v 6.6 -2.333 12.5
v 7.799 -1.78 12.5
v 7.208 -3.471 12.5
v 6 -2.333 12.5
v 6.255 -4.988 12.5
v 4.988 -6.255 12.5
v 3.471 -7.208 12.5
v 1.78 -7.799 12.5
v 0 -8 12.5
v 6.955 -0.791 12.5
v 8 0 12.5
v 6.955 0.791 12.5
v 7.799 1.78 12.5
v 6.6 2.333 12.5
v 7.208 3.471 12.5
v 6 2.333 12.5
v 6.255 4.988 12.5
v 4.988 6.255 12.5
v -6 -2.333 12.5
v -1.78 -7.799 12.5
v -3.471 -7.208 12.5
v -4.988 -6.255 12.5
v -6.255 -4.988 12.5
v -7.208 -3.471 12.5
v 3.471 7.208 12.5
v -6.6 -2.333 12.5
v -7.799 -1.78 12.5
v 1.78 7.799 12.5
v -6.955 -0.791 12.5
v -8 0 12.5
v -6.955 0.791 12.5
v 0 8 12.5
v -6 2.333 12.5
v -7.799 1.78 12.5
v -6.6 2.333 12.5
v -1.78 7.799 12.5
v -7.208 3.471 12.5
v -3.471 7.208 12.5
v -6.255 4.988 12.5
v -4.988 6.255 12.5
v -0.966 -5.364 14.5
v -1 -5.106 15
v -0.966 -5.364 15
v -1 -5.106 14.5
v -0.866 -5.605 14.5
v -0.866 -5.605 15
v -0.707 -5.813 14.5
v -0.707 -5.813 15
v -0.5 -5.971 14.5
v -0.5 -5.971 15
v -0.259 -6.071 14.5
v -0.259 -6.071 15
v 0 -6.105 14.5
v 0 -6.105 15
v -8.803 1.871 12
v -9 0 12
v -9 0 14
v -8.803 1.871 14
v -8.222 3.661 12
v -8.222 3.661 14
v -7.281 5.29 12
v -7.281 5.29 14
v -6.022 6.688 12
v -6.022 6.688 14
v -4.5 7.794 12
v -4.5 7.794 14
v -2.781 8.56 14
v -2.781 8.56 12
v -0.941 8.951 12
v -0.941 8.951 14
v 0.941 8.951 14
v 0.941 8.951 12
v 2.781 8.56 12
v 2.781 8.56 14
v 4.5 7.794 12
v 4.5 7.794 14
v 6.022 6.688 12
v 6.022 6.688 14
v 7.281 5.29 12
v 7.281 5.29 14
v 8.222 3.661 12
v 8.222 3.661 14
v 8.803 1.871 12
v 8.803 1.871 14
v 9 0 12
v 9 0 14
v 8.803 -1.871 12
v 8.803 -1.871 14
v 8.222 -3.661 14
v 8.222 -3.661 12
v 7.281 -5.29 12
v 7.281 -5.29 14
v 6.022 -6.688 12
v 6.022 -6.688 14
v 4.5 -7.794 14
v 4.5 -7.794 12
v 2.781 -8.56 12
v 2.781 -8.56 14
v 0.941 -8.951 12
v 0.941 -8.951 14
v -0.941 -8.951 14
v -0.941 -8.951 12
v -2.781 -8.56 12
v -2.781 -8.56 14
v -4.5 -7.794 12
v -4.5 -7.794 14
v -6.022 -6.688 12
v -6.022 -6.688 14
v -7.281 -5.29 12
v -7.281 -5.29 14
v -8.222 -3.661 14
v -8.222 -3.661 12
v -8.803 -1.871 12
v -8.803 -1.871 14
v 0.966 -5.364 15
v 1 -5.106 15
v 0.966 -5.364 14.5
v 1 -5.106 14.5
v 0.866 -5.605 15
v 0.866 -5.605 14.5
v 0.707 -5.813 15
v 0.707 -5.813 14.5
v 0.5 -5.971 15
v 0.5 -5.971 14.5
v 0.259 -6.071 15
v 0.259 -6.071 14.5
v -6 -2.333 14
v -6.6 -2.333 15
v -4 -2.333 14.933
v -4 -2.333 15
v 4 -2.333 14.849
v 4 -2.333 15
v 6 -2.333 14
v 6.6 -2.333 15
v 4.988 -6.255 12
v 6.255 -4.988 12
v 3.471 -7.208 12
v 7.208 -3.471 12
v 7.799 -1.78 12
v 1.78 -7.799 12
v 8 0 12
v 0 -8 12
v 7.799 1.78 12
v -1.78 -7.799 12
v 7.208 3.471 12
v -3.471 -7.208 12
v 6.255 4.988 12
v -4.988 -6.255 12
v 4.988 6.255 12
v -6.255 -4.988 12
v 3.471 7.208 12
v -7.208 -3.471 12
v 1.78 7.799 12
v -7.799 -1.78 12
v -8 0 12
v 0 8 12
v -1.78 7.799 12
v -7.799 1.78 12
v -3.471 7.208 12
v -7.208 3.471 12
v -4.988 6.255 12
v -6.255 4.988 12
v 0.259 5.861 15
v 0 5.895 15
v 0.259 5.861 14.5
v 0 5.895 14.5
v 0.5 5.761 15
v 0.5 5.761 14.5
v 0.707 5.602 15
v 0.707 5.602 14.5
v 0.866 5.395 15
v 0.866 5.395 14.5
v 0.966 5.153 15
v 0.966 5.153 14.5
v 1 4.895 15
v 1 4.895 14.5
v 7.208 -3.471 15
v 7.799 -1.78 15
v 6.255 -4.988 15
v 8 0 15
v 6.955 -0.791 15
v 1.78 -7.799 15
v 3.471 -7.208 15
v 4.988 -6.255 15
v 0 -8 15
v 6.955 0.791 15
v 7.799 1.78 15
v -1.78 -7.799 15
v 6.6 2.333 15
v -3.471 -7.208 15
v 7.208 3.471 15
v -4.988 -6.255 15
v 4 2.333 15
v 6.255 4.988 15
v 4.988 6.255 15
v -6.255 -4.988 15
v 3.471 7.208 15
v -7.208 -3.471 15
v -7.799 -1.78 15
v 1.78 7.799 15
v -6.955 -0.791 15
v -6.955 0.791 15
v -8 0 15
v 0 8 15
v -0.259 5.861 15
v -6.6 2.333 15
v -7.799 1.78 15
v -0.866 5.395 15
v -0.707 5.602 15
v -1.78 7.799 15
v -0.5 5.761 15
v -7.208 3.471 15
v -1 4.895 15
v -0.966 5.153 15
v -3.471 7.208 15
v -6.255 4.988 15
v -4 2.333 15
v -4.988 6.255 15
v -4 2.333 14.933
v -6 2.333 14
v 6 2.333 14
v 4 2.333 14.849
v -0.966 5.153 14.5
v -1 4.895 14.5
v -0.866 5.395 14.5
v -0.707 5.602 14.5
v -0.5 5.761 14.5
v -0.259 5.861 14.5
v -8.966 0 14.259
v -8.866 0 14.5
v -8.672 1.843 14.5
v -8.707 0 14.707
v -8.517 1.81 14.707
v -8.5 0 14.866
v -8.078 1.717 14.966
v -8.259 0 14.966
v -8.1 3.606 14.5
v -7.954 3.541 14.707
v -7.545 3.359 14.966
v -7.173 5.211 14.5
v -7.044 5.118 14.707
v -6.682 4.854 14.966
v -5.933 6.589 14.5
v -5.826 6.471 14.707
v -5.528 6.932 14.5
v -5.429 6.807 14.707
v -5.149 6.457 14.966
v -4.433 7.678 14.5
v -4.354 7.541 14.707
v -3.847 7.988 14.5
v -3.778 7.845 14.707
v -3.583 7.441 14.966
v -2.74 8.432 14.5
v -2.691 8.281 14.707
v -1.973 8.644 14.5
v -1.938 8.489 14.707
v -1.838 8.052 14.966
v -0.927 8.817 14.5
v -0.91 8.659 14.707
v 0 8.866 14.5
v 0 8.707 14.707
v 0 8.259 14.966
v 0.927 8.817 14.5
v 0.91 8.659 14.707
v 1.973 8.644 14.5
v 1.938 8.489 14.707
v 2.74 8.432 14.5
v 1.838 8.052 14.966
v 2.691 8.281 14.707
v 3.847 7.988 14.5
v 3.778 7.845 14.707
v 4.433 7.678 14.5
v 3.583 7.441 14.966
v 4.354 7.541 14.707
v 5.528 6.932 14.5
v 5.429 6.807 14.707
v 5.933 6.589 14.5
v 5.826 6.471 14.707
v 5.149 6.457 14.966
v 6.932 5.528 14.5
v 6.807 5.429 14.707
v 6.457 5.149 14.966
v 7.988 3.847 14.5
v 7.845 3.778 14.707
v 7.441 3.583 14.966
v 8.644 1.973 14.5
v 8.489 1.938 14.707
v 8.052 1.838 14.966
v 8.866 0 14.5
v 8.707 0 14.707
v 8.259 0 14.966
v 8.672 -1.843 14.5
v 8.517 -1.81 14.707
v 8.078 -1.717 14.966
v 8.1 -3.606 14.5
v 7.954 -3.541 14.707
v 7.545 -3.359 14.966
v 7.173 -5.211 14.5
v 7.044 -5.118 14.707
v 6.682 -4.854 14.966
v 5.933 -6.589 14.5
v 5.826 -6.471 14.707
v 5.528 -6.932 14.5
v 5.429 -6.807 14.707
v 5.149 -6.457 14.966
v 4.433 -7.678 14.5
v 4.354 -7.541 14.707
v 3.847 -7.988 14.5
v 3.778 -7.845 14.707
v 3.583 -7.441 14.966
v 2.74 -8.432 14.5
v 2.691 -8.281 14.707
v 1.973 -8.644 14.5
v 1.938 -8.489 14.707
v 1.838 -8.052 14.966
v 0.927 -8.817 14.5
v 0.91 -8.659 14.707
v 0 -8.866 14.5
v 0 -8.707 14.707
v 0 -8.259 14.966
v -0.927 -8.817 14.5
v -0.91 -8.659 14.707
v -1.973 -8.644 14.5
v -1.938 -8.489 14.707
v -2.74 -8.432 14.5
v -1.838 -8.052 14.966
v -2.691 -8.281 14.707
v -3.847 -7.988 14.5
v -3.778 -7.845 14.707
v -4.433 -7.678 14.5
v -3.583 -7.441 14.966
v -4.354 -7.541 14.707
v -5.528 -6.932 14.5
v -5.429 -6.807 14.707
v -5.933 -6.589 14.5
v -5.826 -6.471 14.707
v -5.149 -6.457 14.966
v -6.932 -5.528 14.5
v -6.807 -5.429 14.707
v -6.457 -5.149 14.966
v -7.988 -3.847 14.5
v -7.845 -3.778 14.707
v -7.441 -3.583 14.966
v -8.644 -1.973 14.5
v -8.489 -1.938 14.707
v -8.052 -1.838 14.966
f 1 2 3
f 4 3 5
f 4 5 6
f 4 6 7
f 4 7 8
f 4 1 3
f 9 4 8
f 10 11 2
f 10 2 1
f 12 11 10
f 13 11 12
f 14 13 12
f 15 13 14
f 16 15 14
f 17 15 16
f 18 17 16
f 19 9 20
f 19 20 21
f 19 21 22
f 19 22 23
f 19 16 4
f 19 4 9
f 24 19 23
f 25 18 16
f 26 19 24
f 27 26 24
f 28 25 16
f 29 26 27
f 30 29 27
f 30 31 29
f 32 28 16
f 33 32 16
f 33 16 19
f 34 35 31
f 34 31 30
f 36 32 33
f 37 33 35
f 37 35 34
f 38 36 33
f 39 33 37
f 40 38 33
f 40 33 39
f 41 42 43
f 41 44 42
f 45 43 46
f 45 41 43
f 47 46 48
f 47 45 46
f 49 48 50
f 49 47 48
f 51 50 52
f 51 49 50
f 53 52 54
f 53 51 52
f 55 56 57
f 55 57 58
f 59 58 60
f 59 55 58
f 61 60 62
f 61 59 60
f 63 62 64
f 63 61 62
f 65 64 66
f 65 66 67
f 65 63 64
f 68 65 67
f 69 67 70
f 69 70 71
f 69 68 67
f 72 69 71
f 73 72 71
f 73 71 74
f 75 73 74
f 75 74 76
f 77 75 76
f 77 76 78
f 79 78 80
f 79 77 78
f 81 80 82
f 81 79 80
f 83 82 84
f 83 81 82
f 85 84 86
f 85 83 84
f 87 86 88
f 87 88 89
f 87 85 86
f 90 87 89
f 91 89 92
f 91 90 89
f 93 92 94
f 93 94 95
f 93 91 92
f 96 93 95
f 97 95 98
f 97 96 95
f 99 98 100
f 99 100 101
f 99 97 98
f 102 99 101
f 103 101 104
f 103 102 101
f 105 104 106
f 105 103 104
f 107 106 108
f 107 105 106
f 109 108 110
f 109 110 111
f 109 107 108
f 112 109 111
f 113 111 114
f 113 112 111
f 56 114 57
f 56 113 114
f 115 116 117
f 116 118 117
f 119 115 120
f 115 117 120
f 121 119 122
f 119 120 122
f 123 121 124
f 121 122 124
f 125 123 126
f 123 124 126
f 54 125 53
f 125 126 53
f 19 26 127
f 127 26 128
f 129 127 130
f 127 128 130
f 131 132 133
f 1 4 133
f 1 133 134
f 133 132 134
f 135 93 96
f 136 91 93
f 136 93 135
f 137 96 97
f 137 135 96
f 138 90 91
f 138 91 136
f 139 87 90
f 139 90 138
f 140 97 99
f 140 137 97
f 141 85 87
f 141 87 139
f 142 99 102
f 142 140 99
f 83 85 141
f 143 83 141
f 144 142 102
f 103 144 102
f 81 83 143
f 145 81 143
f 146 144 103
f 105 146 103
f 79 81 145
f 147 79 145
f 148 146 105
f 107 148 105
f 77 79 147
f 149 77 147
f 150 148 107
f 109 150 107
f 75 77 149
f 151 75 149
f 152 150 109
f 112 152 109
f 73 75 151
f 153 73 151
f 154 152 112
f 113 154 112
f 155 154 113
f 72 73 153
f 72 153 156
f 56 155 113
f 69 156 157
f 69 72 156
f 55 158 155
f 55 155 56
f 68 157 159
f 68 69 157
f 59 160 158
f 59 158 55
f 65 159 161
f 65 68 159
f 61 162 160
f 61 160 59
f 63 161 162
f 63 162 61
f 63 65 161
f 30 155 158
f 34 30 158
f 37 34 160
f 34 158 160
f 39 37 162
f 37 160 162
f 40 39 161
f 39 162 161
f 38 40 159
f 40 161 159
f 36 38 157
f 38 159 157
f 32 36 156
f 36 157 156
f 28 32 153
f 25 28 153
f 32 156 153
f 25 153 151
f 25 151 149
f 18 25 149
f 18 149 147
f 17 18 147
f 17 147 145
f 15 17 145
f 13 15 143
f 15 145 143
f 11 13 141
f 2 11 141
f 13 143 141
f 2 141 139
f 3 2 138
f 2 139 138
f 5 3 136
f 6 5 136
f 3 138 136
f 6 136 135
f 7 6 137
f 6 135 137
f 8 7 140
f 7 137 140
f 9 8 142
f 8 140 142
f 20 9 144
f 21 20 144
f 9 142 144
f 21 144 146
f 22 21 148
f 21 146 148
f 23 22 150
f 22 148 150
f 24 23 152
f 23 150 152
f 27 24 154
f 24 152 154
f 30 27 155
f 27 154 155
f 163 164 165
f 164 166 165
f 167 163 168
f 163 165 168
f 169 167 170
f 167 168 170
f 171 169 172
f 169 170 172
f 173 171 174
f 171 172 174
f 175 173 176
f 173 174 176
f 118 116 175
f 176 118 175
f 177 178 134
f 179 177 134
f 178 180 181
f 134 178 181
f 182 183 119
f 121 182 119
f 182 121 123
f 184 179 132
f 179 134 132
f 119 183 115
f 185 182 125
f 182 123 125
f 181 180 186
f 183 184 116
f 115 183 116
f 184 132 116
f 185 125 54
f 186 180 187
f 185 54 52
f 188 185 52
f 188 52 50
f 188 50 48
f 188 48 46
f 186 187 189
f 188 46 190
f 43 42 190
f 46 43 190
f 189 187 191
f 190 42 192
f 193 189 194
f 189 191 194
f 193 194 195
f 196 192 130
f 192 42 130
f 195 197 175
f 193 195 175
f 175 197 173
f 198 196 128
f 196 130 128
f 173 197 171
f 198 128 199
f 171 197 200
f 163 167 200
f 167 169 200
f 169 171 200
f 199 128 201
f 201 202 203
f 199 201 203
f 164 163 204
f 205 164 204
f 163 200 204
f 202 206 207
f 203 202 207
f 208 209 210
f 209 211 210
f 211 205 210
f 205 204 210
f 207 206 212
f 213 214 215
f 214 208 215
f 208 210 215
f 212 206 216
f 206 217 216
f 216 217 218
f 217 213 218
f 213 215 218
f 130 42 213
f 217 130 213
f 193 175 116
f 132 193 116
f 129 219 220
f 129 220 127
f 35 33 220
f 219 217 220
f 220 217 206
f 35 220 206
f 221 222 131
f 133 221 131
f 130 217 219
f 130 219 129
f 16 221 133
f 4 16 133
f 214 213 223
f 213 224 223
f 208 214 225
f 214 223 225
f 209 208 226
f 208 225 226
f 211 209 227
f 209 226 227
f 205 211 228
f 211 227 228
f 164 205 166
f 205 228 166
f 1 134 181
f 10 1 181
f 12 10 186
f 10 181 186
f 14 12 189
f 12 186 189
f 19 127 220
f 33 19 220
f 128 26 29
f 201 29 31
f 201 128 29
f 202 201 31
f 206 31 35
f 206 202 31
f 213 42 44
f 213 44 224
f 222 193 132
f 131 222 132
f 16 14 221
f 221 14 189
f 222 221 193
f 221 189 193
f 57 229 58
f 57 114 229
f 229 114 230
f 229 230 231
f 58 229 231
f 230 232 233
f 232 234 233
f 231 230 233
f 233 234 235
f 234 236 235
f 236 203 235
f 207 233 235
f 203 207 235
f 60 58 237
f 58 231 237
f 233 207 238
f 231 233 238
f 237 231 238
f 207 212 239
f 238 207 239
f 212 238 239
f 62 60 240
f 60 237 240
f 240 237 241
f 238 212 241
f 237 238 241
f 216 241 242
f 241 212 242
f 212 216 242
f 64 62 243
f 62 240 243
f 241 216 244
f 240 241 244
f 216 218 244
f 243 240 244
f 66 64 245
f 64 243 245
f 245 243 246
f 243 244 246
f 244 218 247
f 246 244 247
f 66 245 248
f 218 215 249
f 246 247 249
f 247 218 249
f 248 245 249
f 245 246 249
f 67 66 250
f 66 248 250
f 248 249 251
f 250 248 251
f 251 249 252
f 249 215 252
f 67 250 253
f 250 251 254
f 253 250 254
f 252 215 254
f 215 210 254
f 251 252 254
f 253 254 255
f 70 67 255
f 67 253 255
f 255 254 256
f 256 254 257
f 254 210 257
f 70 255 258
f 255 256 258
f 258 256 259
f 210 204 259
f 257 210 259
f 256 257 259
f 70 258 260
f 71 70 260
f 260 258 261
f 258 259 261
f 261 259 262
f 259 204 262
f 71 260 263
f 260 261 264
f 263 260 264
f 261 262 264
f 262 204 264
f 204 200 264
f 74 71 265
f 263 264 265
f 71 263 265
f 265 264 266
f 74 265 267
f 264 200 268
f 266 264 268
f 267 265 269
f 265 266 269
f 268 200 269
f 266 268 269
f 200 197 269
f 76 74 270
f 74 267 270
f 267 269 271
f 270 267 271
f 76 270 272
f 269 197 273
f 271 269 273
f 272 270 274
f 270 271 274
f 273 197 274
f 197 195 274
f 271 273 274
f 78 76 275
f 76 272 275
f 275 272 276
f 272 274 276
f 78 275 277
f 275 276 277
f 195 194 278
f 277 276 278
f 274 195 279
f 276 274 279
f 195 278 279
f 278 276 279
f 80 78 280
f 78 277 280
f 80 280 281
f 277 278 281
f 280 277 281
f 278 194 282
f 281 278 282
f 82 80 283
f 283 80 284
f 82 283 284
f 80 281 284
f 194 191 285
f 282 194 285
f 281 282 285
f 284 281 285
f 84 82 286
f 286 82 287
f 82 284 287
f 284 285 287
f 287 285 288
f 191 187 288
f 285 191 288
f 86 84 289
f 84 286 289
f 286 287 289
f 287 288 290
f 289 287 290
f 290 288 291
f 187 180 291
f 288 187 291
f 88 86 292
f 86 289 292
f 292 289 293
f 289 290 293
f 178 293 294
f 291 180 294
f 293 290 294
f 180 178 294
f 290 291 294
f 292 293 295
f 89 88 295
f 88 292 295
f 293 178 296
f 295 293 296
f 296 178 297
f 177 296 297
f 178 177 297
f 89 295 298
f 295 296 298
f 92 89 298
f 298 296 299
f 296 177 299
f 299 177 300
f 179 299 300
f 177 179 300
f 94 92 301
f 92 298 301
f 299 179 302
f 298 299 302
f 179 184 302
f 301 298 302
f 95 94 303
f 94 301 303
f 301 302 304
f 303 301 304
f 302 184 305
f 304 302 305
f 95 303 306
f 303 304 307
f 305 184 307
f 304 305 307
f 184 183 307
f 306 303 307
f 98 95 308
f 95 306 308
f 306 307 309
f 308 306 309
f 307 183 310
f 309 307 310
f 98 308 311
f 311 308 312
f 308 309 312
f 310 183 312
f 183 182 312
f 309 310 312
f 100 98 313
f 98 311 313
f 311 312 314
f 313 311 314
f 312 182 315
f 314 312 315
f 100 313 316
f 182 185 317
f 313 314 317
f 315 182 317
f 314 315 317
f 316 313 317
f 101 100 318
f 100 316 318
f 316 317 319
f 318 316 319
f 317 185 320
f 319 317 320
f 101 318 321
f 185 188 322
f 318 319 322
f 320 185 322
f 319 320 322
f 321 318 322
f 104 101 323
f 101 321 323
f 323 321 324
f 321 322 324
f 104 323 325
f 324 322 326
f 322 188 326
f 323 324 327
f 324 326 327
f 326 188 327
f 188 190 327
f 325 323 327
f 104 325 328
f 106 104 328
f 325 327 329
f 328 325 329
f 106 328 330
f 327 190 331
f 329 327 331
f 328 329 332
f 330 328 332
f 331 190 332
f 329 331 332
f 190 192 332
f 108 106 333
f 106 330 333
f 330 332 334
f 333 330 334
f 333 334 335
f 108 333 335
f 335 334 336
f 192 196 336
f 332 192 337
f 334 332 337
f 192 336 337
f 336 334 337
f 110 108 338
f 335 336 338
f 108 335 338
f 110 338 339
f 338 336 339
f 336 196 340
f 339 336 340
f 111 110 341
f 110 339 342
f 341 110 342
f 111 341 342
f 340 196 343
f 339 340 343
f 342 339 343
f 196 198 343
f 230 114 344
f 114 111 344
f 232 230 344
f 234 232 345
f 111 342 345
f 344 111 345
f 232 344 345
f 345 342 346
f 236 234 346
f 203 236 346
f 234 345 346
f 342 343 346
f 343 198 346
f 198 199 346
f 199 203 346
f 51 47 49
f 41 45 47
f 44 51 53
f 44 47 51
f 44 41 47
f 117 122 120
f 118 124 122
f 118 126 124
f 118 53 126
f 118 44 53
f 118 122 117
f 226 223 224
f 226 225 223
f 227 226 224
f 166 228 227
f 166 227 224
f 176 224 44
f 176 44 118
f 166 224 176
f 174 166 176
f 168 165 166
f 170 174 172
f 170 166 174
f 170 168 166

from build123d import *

# Parameters (mm, degrees)
SKETCH_1_R          = 9
EXTRUDE_1_DEPTH     = 3
FILLET_1_R          = 1
SKETCH_3_W          = 2
SKETCH_3_H          = 12
CUT_EXTRUDE_1_DEPTH = 0.5
FILLET_2_R          = 1
CUT_EXTRUDE_2_DEPTH = 1
CHAMFER_2_SIZE      = 2
CHAMFER_2_SIZE2     = 0.932615316
CHAMFER_5_SIZE      = 2
CHAMFER_5_SIZE2     = 0.848949632
CUT_EXTRUDE_3_DEPTH = 8
CUT_EXTRUDE_START   = -2
SKETCH_7_R          = 7
CUT_EXTRUDE_4_DEPTH = 2
EXTRUDE_2_DEPTH     = 2
SKETCH_9_R          = 8
CUT_EXTRUDE_5_DEPTH = 0.5


with BuildPart() as part:
    # 草图1 → 凸台-拉伸1 (new body)
    with BuildSketch(Plane(origin=(0, 0, 12), x_dir=(-1, 0, 0), z_dir=(0, 0, -1))):
        Circle(SKETCH_1_R)
    extrude(amount=-EXTRUDE_1_DEPTH)

    # 圆角1
    fillet_1_edges = [part.edges().sort_by_distance(p)[0] for p in [
        (9, 0, 15),
    ]]
    fillet(fillet_1_edges, radius=FILLET_1_R)

    # 草图3 → 切除-拉伸1 (cut)
    with BuildSketch(Plane.XY.offset(15)):
        with Locations((0, -0.105406486)):
            Rectangle(SKETCH_3_W, SKETCH_3_H)
    extrude(amount=-CUT_EXTRUDE_1_DEPTH, mode=Mode.SUBTRACT)

    # 圆角2
    fillet_2_edges = [part.edges().sort_by_distance(p)[0] for p in [
        (1, -6.105406486, 14.75),
        (-1, -6.105406486, 14.75),
        (1, 5.894593514, 14.75),
        (-1, 5.894593514, 14.75),
    ]]
    fillet(fillet_2_edges, radius=FILLET_2_R - 0.0001)  # a hair under: the kernel refuses the full size

    # 草图4 → 切除-拉伸2 (cut)
    with BuildSketch(Plane.XY.offset(15)):
        with BuildLine():
            Line((-6.599663291, 2.333333333), (-4, 2.333333333))
            Line((-4, 2.333333333), (-4, -2.333333333))
            Line((-4, -2.333333333), (-6.599663291, -2.333333333))
            ThreePointArc((-6.599663291, -2.333333333), (-7, 0), (-6.599663291, 2.333333333))
        make_face()
        with BuildLine():
            Line((4, -2.333333333), (6.599663291, -2.333333333))
            ThreePointArc((6.599663291, -2.333333333), (7, 0), (6.599663291, 2.333333333))
            Line((6.599663291, 2.333333333), (4, 2.333333333))
            Line((4, 2.333333333), (4, -2.333333333))
        make_face()
    extrude(amount=-CUT_EXTRUDE_2_DEPTH, mode=Mode.SUBTRACT)

    # 倒角2
    chamfer_2_edges = [part.edges().sort_by_distance(p)[0] for p in [
        (-4, 0, 14),
    ]]
    chamfer_2_side = [part.faces().sort_by_distance(p)[0] for p in [
        (-5.436521823, 0, 14),
    ]]
    chamfer(chamfer_2_edges, length=CHAMFER_2_SIZE, length2=CHAMFER_2_SIZE2, reference=chamfer_2_side[0])

    # 倒角5
    chamfer_5_edges = [part.edges().sort_by_distance(p)[0] for p in [
        (4, 0, 14),
    ]]
    chamfer_5_side = [part.faces().sort_by_distance(p)[0] for p in [
        (5.436521823, 0, 14),
    ]]
    chamfer(chamfer_5_edges, length=CHAMFER_5_SIZE, length2=CHAMFER_5_SIZE2, reference=chamfer_5_side[0])

    # 草图6 → 切除-拉伸3 (cut)
    with BuildSketch(Plane.XY.offset(14)):
        with BuildLine():
            Line((-6.599663291, -2.333333333), (-6, -2.333333333))
            Line((-6, -2.333333333), (-6, 2.333333333))
            Line((-6, 2.333333333), (-6.599663291, 2.333333333))
            ThreePointArc((-6.599663291, 2.333333333), (-7, 0), (-6.599663291, -2.333333333))
        make_face()
        with BuildLine():
            Line((6.599663291, 2.333333333), (6, 2.333333333))
            Line((6, 2.333333333), (6, -2.333333333))
            Line((6, -2.333333333), (6.599663291, -2.333333333))
            ThreePointArc((6.599663291, -2.333333333), (7, 0), (6.599663291, 2.333333333))
        make_face()
    extrude(amount=-CUT_EXTRUDE_3_DEPTH, mode=Mode.SUBTRACT)

    # 草图7 → 切除-拉伸4 (cut)
    with BuildSketch(Plane(origin=(0, 0, 12), x_dir=(-1, 0, 0), z_dir=(0, 0, -1)).offset(CUT_EXTRUDE_START)):
        with Locations(Location((0, 0, 0), (0, 0, 199.471220634))):
            Circle(SKETCH_7_R)
    extrude(amount=CUT_EXTRUDE_4_DEPTH, mode=Mode.SUBTRACT)

    # 草图8 → 凸台-拉伸2 (add)
    with BuildSketch(Plane(origin=(0, 0, 14), x_dir=(-1, 0, 0), z_dir=(0, 0, -1))):
        with BuildLine():
            Line((-6.599663291, 2.333333333), (-6, 2.333333333))
            Line((-6, 2.333333333), (-6, -2.333333333))
            Line((-6, -2.333333333), (-6.599663291, -2.333333333))
            ThreePointArc((-6.599663291, -2.333333333), (0, -7), (6.599663291, -2.333333333))
            Line((6.599663291, -2.333333333), (6, -2.333333333))
            Line((6, -2.333333333), (6, 2.333333333))
            Line((6, 2.333333333), (6.599663291, 2.333333333))
            ThreePointArc((6.599663291, 2.333333333), (0, 7), (-6.599663291, 2.333333333))
        make_face()
    extrude(amount=EXTRUDE_2_DEPTH)

    # 草图9 → 切除-拉伸5 (cut)
    with BuildSketch(Plane(origin=(0, 0, 12), x_dir=(-1, 0, 0), z_dir=(0, 0, -1))):
        Circle(SKETCH_9_R)
    extrude(amount=-CUT_EXTRUDE_5_DEPTH, mode=Mode.SUBTRACT)


solid = part.part
